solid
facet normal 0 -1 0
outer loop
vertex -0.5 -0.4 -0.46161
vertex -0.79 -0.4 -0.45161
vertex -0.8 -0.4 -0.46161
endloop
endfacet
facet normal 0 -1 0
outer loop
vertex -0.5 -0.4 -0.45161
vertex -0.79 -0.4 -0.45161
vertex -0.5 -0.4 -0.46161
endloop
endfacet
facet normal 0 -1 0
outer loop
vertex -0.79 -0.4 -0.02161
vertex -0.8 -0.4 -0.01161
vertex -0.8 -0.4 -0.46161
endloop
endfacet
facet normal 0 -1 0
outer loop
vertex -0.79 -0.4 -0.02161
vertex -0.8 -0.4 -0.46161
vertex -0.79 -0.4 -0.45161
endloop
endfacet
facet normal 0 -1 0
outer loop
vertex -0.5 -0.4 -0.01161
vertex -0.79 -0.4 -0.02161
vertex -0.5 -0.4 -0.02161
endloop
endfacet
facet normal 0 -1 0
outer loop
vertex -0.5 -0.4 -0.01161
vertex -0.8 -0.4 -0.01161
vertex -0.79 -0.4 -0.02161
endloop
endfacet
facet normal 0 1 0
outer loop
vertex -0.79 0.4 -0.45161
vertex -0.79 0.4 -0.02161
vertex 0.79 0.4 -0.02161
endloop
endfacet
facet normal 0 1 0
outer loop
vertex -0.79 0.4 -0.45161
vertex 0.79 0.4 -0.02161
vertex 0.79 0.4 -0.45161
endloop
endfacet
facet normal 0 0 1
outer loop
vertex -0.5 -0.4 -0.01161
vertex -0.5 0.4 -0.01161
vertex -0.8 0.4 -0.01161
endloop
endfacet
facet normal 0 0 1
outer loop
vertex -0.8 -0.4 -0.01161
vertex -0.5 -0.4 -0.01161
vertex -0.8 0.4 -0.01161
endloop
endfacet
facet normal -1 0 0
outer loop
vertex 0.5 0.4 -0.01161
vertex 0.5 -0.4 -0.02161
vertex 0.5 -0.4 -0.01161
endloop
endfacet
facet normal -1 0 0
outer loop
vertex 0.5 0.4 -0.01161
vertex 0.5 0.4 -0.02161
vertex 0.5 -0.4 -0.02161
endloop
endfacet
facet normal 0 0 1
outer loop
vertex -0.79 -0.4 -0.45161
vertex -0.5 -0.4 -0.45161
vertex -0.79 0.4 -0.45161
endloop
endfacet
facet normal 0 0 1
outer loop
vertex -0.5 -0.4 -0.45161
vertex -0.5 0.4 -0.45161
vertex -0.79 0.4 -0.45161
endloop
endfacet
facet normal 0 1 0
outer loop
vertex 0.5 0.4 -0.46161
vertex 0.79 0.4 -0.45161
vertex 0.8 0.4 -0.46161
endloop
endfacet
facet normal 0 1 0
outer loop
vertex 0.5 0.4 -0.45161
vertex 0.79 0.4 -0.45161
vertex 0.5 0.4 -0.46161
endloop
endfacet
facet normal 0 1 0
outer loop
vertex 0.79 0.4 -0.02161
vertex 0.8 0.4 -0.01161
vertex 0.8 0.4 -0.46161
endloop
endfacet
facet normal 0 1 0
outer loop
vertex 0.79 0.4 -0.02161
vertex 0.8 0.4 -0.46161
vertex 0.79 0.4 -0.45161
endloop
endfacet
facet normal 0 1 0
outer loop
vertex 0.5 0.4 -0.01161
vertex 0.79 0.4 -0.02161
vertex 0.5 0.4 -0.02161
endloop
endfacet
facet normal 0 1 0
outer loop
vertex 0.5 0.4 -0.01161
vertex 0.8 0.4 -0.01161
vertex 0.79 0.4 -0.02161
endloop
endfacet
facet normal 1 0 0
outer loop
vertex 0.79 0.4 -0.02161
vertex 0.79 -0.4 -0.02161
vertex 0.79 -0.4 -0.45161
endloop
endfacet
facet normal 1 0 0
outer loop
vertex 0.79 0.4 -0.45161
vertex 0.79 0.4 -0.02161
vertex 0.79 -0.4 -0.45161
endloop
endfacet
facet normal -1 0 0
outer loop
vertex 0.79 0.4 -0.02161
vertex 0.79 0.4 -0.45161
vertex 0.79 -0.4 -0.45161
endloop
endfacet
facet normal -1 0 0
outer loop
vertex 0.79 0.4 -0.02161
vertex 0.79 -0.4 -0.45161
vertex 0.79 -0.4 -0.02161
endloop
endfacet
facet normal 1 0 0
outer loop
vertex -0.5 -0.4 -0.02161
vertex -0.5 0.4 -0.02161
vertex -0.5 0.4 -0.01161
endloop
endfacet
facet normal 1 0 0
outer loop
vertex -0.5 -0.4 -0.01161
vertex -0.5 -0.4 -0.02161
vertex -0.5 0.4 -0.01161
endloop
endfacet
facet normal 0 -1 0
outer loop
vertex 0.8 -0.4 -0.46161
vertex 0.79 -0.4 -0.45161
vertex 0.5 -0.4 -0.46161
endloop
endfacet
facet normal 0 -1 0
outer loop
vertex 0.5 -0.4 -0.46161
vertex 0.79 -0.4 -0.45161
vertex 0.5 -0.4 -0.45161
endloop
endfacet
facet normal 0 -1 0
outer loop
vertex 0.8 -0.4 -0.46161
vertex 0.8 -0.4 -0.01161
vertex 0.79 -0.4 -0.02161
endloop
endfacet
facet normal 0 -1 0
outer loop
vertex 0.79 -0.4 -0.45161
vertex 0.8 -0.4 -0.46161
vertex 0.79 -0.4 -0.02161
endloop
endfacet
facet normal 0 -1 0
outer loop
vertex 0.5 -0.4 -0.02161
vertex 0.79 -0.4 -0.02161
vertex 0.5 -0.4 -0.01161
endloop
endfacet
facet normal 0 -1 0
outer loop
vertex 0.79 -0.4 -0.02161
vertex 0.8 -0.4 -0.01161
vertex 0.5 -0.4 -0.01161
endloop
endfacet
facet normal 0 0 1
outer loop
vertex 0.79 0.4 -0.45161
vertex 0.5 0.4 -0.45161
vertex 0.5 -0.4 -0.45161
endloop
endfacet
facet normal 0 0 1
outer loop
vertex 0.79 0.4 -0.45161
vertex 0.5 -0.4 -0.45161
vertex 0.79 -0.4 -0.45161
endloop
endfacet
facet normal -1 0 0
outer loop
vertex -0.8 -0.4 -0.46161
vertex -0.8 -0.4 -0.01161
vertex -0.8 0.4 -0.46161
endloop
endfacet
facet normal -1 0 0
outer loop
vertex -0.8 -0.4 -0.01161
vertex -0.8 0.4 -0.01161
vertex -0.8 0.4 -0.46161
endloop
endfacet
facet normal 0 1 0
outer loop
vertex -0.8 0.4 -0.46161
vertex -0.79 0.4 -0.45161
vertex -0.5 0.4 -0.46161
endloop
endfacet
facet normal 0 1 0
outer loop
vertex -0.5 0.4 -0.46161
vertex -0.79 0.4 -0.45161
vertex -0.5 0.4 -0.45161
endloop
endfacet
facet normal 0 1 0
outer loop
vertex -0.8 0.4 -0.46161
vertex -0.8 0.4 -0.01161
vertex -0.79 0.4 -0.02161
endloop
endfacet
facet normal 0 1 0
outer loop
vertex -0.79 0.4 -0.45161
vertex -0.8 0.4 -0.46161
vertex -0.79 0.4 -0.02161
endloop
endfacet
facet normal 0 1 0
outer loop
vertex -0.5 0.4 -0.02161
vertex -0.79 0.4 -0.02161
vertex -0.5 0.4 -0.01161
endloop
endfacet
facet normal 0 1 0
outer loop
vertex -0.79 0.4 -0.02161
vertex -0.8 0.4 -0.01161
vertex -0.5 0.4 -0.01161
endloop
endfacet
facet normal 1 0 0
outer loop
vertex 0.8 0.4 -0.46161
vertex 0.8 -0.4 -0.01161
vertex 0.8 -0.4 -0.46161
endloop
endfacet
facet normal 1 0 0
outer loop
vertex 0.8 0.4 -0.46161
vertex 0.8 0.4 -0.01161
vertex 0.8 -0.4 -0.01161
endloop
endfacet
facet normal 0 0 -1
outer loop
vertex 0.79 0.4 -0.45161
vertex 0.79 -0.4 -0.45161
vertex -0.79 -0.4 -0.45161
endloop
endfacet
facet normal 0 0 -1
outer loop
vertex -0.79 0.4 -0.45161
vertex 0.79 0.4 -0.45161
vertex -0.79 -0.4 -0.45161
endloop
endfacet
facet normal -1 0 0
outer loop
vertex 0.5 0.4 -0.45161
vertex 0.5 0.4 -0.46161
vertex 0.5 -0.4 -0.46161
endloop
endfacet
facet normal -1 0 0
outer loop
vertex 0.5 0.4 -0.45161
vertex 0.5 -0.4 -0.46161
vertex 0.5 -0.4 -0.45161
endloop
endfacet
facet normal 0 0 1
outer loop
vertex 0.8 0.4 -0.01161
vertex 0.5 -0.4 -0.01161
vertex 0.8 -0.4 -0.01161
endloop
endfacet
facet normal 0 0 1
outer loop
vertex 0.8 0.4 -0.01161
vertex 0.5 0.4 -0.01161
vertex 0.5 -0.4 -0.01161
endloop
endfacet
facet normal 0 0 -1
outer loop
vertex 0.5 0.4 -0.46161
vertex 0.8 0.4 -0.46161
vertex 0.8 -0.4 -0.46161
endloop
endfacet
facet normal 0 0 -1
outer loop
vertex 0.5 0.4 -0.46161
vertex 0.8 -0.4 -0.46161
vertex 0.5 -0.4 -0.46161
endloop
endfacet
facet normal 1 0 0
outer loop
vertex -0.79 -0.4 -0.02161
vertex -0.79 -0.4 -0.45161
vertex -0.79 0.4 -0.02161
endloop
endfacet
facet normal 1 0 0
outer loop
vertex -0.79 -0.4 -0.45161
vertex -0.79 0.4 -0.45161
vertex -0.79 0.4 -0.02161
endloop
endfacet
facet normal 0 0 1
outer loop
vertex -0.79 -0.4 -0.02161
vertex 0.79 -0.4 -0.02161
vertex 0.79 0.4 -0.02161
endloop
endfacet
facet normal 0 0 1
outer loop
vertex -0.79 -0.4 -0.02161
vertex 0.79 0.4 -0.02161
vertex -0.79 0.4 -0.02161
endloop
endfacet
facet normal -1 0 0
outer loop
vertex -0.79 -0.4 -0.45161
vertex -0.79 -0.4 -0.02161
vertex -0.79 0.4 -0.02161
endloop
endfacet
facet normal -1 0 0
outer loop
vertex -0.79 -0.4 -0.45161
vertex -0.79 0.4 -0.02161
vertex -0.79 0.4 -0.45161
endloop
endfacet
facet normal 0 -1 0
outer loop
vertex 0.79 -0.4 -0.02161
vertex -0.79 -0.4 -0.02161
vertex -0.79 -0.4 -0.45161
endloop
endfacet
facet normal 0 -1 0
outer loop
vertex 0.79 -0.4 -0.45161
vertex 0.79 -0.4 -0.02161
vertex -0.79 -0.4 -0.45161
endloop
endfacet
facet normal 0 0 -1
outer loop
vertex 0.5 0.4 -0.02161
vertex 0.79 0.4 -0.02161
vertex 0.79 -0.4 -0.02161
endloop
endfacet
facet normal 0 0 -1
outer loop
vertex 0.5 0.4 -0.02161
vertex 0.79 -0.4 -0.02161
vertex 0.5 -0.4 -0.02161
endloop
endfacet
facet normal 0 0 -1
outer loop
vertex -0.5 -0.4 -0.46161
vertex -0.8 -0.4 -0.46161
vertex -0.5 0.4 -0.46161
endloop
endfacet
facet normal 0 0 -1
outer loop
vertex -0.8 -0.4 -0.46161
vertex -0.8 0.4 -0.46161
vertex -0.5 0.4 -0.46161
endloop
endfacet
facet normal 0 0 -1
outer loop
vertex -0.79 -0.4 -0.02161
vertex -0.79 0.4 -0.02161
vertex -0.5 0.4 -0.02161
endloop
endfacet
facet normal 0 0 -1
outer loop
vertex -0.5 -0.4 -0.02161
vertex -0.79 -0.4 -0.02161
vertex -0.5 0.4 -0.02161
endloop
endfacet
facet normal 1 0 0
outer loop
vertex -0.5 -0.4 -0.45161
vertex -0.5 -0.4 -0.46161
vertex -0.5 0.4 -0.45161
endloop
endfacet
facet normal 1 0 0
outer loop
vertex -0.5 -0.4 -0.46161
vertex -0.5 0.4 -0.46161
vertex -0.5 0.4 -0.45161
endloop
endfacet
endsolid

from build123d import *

# Parameters (mm, degrees)
BOSS_EXTRUDE2_DEPTH   = 0.4
BOSS_EXTRUDE2_2_DEPTH = 0.4
BOSS_EXTRUDE3_START   = -0.4
SKETCH5_W             = 0.43
SKETCH5_H             = 1.58
BOSS_EXTRUDE3_DEPTH   = 0.8


with BuildPart() as part:
    # Sketch4 → Boss-Extrude2 (new body, symmetric)
    with BuildSketch(Plane(origin=(0, 0, 0), x_dir=(-1, 0, 0), z_dir=(0, 1, 0))):
        Polygon((-0.8, -0.011612161), (-0.8, -0.461612161), (-0.5, -0.461612161), (-0.5, -0.451612161), (-0.79, -0.451612161), (-0.79, -0.021612161), (-0.5, -0.021612161), (-0.5, -0.011612161), align=None)
    extrude(amount=BOSS_EXTRUDE2_DEPTH, both=True)


with BuildPart() as body_2:
    # Sketch4 → Boss-Extrude2 2 (new body, symmetric)
    with BuildSketch(Plane(origin=(0, 0, 0), x_dir=(-1, 0, 0), z_dir=(0, 1, 0))):
        Polygon((0.5, -0.011612161), (0.8, -0.011612161), (0.8, -0.461612161), (0.5, -0.461612161), (0.5, -0.451612161), (0.79, -0.451612161), (0.79, -0.021612161), (0.5, -0.021612161), align=None)
    extrude(amount=BOSS_EXTRUDE2_2_DEPTH, both=True)


with BuildPart() as body_3:
    # Sketch5 → Boss-Extrude3 (new body)
    with BuildSketch(Plane(origin=(0, 0, 0), x_dir=(0, 0, -1), z_dir=(0, 1, 0)).offset(BOSS_EXTRUDE3_START)):
        with Locations((0.236612161, 0)):
            Rectangle(SKETCH5_W, SKETCH5_H)
    extrude(amount=BOSS_EXTRUDE3_DEPTH)


solid = Compound([part.part, body_2.part, body_3.part])
